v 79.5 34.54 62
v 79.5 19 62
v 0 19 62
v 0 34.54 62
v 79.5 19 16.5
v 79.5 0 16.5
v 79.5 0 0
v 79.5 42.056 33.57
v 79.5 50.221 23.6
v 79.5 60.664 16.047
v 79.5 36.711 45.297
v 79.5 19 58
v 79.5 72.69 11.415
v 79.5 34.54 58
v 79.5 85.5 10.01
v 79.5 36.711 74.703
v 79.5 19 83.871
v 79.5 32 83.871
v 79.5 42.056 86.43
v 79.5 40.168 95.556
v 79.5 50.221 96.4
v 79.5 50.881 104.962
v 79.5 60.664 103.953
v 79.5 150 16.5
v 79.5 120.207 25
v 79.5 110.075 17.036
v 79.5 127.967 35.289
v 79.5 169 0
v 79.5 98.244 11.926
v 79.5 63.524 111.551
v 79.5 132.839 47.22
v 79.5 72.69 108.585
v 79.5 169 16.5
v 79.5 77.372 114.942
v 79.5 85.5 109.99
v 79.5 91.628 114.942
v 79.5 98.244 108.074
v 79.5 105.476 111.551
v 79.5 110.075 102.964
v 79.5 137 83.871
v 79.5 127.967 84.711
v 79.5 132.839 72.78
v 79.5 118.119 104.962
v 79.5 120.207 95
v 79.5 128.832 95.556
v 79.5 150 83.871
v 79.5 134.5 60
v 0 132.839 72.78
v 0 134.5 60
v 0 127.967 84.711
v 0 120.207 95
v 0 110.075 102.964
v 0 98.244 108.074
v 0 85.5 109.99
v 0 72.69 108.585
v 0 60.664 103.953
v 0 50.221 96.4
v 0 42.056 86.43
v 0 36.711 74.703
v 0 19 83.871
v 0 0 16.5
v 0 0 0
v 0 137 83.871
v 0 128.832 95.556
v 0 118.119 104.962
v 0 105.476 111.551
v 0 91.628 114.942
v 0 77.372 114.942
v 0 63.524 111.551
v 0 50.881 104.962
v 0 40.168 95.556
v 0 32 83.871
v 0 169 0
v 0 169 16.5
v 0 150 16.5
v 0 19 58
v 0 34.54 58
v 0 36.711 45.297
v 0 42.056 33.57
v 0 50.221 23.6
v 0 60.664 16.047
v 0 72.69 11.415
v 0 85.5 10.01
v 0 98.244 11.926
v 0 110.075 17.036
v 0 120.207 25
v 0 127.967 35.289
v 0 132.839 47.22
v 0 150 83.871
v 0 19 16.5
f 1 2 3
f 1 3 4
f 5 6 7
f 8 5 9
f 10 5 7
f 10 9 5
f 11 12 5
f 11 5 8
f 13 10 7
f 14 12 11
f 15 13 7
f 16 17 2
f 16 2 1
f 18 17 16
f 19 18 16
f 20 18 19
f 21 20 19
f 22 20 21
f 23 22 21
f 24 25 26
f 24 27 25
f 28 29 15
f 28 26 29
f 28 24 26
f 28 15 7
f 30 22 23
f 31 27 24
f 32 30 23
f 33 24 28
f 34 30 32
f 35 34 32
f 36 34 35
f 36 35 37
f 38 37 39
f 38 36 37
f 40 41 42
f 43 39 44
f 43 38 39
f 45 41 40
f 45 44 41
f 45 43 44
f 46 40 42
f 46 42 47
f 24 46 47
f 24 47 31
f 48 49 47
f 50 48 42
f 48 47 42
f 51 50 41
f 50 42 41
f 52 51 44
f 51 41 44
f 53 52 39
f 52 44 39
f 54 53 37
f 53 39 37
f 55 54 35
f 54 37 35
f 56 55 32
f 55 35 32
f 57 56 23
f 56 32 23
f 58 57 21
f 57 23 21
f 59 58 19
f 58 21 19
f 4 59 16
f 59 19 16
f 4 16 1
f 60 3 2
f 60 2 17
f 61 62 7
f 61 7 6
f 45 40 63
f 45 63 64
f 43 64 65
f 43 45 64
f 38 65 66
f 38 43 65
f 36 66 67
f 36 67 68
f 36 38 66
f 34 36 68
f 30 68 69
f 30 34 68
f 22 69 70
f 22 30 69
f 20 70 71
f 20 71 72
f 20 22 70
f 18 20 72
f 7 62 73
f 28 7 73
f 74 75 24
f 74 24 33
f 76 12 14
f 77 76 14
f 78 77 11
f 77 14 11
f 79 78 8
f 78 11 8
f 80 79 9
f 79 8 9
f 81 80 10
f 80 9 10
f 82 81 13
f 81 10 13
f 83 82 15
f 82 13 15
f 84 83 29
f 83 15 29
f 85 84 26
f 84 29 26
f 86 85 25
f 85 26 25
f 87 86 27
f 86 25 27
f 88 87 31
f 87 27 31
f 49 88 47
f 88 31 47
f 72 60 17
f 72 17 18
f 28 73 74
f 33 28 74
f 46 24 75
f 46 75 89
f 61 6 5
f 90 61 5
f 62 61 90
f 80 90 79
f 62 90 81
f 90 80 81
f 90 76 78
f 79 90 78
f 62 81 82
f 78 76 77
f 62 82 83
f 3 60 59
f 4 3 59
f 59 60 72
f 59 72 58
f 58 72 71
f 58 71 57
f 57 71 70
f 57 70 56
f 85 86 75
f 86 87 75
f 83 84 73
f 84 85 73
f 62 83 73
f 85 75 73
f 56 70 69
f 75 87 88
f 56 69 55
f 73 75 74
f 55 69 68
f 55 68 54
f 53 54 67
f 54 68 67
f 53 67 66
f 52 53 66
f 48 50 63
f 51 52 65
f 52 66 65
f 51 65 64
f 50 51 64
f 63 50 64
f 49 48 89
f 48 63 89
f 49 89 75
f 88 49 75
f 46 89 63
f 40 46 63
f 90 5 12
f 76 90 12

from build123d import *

# Parameters (mm, degrees)
SKETCH_W        = 169
SKETCH_H        = 16.5
SKETCH_W_2      = 131
SKETCH_H_2      = 150
PAD_DEPTH       = 79.5
SKETCH001_R     = 50
POCKET_DEPTH    = 79.501
POCKET001_DEPTH = 79.501
SKETCH003_W     = 30
SKETCH003_H     = 4
POCKET002_DEPTH = 79.501


with BuildPart() as part:
    # Sketch → Pad (new body)
    with BuildSketch(Plane.YZ):
        with Locations((84.5, 8.25)):
            Rectangle(SKETCH_W, SKETCH_H)
        with Locations((84.5, 91.5)):
            Rectangle(SKETCH_W_2, SKETCH_H_2)
    extrude(amount=PAD_DEPTH)

    # Sketch001 (on Face10 of Pad) → Pocket (cut, through all)
    with BuildSketch(Plane.YZ.offset(79.5)):
        with Locations((84.5, 60)):
            Circle(SKETCH001_R)
    extrude(amount=-POCKET_DEPTH, mode=Mode.SUBTRACT)

    # Sketch002 (on Face5 of Pocket) → Pocket001 (cut, through all)
    with BuildSketch(Plane.YZ.offset(79.5)):
        with BuildLine():
            Line((19, 83.870659), (32, 83.870659))
            ThreePointArc((137, 83.870652), (84.500002, 115.370656), (32, 83.870659))
            Line((150, 83.870652), (137, 83.870652))
            Line((183.643631, 183.574966), (150, 83.870652))
            Line((-15.737751, 179.863068), (183.643631, 183.574966))
            Line((19, 83.870659), (-15.737751, 179.863068))
        make_face()
    extrude(amount=-POCKET001_DEPTH, mode=Mode.SUBTRACT)

    # Sketch003 (on Face4 of Pocket001) → Pocket002 (cut, through all)
    with BuildSketch(Plane.YZ.offset(79.5)):
        with Locations((34, 60)):
            Rectangle(SKETCH003_W, SKETCH003_H)
    extrude(amount=-POCKET002_DEPTH, mode=Mode.SUBTRACT)


solid = part.part
